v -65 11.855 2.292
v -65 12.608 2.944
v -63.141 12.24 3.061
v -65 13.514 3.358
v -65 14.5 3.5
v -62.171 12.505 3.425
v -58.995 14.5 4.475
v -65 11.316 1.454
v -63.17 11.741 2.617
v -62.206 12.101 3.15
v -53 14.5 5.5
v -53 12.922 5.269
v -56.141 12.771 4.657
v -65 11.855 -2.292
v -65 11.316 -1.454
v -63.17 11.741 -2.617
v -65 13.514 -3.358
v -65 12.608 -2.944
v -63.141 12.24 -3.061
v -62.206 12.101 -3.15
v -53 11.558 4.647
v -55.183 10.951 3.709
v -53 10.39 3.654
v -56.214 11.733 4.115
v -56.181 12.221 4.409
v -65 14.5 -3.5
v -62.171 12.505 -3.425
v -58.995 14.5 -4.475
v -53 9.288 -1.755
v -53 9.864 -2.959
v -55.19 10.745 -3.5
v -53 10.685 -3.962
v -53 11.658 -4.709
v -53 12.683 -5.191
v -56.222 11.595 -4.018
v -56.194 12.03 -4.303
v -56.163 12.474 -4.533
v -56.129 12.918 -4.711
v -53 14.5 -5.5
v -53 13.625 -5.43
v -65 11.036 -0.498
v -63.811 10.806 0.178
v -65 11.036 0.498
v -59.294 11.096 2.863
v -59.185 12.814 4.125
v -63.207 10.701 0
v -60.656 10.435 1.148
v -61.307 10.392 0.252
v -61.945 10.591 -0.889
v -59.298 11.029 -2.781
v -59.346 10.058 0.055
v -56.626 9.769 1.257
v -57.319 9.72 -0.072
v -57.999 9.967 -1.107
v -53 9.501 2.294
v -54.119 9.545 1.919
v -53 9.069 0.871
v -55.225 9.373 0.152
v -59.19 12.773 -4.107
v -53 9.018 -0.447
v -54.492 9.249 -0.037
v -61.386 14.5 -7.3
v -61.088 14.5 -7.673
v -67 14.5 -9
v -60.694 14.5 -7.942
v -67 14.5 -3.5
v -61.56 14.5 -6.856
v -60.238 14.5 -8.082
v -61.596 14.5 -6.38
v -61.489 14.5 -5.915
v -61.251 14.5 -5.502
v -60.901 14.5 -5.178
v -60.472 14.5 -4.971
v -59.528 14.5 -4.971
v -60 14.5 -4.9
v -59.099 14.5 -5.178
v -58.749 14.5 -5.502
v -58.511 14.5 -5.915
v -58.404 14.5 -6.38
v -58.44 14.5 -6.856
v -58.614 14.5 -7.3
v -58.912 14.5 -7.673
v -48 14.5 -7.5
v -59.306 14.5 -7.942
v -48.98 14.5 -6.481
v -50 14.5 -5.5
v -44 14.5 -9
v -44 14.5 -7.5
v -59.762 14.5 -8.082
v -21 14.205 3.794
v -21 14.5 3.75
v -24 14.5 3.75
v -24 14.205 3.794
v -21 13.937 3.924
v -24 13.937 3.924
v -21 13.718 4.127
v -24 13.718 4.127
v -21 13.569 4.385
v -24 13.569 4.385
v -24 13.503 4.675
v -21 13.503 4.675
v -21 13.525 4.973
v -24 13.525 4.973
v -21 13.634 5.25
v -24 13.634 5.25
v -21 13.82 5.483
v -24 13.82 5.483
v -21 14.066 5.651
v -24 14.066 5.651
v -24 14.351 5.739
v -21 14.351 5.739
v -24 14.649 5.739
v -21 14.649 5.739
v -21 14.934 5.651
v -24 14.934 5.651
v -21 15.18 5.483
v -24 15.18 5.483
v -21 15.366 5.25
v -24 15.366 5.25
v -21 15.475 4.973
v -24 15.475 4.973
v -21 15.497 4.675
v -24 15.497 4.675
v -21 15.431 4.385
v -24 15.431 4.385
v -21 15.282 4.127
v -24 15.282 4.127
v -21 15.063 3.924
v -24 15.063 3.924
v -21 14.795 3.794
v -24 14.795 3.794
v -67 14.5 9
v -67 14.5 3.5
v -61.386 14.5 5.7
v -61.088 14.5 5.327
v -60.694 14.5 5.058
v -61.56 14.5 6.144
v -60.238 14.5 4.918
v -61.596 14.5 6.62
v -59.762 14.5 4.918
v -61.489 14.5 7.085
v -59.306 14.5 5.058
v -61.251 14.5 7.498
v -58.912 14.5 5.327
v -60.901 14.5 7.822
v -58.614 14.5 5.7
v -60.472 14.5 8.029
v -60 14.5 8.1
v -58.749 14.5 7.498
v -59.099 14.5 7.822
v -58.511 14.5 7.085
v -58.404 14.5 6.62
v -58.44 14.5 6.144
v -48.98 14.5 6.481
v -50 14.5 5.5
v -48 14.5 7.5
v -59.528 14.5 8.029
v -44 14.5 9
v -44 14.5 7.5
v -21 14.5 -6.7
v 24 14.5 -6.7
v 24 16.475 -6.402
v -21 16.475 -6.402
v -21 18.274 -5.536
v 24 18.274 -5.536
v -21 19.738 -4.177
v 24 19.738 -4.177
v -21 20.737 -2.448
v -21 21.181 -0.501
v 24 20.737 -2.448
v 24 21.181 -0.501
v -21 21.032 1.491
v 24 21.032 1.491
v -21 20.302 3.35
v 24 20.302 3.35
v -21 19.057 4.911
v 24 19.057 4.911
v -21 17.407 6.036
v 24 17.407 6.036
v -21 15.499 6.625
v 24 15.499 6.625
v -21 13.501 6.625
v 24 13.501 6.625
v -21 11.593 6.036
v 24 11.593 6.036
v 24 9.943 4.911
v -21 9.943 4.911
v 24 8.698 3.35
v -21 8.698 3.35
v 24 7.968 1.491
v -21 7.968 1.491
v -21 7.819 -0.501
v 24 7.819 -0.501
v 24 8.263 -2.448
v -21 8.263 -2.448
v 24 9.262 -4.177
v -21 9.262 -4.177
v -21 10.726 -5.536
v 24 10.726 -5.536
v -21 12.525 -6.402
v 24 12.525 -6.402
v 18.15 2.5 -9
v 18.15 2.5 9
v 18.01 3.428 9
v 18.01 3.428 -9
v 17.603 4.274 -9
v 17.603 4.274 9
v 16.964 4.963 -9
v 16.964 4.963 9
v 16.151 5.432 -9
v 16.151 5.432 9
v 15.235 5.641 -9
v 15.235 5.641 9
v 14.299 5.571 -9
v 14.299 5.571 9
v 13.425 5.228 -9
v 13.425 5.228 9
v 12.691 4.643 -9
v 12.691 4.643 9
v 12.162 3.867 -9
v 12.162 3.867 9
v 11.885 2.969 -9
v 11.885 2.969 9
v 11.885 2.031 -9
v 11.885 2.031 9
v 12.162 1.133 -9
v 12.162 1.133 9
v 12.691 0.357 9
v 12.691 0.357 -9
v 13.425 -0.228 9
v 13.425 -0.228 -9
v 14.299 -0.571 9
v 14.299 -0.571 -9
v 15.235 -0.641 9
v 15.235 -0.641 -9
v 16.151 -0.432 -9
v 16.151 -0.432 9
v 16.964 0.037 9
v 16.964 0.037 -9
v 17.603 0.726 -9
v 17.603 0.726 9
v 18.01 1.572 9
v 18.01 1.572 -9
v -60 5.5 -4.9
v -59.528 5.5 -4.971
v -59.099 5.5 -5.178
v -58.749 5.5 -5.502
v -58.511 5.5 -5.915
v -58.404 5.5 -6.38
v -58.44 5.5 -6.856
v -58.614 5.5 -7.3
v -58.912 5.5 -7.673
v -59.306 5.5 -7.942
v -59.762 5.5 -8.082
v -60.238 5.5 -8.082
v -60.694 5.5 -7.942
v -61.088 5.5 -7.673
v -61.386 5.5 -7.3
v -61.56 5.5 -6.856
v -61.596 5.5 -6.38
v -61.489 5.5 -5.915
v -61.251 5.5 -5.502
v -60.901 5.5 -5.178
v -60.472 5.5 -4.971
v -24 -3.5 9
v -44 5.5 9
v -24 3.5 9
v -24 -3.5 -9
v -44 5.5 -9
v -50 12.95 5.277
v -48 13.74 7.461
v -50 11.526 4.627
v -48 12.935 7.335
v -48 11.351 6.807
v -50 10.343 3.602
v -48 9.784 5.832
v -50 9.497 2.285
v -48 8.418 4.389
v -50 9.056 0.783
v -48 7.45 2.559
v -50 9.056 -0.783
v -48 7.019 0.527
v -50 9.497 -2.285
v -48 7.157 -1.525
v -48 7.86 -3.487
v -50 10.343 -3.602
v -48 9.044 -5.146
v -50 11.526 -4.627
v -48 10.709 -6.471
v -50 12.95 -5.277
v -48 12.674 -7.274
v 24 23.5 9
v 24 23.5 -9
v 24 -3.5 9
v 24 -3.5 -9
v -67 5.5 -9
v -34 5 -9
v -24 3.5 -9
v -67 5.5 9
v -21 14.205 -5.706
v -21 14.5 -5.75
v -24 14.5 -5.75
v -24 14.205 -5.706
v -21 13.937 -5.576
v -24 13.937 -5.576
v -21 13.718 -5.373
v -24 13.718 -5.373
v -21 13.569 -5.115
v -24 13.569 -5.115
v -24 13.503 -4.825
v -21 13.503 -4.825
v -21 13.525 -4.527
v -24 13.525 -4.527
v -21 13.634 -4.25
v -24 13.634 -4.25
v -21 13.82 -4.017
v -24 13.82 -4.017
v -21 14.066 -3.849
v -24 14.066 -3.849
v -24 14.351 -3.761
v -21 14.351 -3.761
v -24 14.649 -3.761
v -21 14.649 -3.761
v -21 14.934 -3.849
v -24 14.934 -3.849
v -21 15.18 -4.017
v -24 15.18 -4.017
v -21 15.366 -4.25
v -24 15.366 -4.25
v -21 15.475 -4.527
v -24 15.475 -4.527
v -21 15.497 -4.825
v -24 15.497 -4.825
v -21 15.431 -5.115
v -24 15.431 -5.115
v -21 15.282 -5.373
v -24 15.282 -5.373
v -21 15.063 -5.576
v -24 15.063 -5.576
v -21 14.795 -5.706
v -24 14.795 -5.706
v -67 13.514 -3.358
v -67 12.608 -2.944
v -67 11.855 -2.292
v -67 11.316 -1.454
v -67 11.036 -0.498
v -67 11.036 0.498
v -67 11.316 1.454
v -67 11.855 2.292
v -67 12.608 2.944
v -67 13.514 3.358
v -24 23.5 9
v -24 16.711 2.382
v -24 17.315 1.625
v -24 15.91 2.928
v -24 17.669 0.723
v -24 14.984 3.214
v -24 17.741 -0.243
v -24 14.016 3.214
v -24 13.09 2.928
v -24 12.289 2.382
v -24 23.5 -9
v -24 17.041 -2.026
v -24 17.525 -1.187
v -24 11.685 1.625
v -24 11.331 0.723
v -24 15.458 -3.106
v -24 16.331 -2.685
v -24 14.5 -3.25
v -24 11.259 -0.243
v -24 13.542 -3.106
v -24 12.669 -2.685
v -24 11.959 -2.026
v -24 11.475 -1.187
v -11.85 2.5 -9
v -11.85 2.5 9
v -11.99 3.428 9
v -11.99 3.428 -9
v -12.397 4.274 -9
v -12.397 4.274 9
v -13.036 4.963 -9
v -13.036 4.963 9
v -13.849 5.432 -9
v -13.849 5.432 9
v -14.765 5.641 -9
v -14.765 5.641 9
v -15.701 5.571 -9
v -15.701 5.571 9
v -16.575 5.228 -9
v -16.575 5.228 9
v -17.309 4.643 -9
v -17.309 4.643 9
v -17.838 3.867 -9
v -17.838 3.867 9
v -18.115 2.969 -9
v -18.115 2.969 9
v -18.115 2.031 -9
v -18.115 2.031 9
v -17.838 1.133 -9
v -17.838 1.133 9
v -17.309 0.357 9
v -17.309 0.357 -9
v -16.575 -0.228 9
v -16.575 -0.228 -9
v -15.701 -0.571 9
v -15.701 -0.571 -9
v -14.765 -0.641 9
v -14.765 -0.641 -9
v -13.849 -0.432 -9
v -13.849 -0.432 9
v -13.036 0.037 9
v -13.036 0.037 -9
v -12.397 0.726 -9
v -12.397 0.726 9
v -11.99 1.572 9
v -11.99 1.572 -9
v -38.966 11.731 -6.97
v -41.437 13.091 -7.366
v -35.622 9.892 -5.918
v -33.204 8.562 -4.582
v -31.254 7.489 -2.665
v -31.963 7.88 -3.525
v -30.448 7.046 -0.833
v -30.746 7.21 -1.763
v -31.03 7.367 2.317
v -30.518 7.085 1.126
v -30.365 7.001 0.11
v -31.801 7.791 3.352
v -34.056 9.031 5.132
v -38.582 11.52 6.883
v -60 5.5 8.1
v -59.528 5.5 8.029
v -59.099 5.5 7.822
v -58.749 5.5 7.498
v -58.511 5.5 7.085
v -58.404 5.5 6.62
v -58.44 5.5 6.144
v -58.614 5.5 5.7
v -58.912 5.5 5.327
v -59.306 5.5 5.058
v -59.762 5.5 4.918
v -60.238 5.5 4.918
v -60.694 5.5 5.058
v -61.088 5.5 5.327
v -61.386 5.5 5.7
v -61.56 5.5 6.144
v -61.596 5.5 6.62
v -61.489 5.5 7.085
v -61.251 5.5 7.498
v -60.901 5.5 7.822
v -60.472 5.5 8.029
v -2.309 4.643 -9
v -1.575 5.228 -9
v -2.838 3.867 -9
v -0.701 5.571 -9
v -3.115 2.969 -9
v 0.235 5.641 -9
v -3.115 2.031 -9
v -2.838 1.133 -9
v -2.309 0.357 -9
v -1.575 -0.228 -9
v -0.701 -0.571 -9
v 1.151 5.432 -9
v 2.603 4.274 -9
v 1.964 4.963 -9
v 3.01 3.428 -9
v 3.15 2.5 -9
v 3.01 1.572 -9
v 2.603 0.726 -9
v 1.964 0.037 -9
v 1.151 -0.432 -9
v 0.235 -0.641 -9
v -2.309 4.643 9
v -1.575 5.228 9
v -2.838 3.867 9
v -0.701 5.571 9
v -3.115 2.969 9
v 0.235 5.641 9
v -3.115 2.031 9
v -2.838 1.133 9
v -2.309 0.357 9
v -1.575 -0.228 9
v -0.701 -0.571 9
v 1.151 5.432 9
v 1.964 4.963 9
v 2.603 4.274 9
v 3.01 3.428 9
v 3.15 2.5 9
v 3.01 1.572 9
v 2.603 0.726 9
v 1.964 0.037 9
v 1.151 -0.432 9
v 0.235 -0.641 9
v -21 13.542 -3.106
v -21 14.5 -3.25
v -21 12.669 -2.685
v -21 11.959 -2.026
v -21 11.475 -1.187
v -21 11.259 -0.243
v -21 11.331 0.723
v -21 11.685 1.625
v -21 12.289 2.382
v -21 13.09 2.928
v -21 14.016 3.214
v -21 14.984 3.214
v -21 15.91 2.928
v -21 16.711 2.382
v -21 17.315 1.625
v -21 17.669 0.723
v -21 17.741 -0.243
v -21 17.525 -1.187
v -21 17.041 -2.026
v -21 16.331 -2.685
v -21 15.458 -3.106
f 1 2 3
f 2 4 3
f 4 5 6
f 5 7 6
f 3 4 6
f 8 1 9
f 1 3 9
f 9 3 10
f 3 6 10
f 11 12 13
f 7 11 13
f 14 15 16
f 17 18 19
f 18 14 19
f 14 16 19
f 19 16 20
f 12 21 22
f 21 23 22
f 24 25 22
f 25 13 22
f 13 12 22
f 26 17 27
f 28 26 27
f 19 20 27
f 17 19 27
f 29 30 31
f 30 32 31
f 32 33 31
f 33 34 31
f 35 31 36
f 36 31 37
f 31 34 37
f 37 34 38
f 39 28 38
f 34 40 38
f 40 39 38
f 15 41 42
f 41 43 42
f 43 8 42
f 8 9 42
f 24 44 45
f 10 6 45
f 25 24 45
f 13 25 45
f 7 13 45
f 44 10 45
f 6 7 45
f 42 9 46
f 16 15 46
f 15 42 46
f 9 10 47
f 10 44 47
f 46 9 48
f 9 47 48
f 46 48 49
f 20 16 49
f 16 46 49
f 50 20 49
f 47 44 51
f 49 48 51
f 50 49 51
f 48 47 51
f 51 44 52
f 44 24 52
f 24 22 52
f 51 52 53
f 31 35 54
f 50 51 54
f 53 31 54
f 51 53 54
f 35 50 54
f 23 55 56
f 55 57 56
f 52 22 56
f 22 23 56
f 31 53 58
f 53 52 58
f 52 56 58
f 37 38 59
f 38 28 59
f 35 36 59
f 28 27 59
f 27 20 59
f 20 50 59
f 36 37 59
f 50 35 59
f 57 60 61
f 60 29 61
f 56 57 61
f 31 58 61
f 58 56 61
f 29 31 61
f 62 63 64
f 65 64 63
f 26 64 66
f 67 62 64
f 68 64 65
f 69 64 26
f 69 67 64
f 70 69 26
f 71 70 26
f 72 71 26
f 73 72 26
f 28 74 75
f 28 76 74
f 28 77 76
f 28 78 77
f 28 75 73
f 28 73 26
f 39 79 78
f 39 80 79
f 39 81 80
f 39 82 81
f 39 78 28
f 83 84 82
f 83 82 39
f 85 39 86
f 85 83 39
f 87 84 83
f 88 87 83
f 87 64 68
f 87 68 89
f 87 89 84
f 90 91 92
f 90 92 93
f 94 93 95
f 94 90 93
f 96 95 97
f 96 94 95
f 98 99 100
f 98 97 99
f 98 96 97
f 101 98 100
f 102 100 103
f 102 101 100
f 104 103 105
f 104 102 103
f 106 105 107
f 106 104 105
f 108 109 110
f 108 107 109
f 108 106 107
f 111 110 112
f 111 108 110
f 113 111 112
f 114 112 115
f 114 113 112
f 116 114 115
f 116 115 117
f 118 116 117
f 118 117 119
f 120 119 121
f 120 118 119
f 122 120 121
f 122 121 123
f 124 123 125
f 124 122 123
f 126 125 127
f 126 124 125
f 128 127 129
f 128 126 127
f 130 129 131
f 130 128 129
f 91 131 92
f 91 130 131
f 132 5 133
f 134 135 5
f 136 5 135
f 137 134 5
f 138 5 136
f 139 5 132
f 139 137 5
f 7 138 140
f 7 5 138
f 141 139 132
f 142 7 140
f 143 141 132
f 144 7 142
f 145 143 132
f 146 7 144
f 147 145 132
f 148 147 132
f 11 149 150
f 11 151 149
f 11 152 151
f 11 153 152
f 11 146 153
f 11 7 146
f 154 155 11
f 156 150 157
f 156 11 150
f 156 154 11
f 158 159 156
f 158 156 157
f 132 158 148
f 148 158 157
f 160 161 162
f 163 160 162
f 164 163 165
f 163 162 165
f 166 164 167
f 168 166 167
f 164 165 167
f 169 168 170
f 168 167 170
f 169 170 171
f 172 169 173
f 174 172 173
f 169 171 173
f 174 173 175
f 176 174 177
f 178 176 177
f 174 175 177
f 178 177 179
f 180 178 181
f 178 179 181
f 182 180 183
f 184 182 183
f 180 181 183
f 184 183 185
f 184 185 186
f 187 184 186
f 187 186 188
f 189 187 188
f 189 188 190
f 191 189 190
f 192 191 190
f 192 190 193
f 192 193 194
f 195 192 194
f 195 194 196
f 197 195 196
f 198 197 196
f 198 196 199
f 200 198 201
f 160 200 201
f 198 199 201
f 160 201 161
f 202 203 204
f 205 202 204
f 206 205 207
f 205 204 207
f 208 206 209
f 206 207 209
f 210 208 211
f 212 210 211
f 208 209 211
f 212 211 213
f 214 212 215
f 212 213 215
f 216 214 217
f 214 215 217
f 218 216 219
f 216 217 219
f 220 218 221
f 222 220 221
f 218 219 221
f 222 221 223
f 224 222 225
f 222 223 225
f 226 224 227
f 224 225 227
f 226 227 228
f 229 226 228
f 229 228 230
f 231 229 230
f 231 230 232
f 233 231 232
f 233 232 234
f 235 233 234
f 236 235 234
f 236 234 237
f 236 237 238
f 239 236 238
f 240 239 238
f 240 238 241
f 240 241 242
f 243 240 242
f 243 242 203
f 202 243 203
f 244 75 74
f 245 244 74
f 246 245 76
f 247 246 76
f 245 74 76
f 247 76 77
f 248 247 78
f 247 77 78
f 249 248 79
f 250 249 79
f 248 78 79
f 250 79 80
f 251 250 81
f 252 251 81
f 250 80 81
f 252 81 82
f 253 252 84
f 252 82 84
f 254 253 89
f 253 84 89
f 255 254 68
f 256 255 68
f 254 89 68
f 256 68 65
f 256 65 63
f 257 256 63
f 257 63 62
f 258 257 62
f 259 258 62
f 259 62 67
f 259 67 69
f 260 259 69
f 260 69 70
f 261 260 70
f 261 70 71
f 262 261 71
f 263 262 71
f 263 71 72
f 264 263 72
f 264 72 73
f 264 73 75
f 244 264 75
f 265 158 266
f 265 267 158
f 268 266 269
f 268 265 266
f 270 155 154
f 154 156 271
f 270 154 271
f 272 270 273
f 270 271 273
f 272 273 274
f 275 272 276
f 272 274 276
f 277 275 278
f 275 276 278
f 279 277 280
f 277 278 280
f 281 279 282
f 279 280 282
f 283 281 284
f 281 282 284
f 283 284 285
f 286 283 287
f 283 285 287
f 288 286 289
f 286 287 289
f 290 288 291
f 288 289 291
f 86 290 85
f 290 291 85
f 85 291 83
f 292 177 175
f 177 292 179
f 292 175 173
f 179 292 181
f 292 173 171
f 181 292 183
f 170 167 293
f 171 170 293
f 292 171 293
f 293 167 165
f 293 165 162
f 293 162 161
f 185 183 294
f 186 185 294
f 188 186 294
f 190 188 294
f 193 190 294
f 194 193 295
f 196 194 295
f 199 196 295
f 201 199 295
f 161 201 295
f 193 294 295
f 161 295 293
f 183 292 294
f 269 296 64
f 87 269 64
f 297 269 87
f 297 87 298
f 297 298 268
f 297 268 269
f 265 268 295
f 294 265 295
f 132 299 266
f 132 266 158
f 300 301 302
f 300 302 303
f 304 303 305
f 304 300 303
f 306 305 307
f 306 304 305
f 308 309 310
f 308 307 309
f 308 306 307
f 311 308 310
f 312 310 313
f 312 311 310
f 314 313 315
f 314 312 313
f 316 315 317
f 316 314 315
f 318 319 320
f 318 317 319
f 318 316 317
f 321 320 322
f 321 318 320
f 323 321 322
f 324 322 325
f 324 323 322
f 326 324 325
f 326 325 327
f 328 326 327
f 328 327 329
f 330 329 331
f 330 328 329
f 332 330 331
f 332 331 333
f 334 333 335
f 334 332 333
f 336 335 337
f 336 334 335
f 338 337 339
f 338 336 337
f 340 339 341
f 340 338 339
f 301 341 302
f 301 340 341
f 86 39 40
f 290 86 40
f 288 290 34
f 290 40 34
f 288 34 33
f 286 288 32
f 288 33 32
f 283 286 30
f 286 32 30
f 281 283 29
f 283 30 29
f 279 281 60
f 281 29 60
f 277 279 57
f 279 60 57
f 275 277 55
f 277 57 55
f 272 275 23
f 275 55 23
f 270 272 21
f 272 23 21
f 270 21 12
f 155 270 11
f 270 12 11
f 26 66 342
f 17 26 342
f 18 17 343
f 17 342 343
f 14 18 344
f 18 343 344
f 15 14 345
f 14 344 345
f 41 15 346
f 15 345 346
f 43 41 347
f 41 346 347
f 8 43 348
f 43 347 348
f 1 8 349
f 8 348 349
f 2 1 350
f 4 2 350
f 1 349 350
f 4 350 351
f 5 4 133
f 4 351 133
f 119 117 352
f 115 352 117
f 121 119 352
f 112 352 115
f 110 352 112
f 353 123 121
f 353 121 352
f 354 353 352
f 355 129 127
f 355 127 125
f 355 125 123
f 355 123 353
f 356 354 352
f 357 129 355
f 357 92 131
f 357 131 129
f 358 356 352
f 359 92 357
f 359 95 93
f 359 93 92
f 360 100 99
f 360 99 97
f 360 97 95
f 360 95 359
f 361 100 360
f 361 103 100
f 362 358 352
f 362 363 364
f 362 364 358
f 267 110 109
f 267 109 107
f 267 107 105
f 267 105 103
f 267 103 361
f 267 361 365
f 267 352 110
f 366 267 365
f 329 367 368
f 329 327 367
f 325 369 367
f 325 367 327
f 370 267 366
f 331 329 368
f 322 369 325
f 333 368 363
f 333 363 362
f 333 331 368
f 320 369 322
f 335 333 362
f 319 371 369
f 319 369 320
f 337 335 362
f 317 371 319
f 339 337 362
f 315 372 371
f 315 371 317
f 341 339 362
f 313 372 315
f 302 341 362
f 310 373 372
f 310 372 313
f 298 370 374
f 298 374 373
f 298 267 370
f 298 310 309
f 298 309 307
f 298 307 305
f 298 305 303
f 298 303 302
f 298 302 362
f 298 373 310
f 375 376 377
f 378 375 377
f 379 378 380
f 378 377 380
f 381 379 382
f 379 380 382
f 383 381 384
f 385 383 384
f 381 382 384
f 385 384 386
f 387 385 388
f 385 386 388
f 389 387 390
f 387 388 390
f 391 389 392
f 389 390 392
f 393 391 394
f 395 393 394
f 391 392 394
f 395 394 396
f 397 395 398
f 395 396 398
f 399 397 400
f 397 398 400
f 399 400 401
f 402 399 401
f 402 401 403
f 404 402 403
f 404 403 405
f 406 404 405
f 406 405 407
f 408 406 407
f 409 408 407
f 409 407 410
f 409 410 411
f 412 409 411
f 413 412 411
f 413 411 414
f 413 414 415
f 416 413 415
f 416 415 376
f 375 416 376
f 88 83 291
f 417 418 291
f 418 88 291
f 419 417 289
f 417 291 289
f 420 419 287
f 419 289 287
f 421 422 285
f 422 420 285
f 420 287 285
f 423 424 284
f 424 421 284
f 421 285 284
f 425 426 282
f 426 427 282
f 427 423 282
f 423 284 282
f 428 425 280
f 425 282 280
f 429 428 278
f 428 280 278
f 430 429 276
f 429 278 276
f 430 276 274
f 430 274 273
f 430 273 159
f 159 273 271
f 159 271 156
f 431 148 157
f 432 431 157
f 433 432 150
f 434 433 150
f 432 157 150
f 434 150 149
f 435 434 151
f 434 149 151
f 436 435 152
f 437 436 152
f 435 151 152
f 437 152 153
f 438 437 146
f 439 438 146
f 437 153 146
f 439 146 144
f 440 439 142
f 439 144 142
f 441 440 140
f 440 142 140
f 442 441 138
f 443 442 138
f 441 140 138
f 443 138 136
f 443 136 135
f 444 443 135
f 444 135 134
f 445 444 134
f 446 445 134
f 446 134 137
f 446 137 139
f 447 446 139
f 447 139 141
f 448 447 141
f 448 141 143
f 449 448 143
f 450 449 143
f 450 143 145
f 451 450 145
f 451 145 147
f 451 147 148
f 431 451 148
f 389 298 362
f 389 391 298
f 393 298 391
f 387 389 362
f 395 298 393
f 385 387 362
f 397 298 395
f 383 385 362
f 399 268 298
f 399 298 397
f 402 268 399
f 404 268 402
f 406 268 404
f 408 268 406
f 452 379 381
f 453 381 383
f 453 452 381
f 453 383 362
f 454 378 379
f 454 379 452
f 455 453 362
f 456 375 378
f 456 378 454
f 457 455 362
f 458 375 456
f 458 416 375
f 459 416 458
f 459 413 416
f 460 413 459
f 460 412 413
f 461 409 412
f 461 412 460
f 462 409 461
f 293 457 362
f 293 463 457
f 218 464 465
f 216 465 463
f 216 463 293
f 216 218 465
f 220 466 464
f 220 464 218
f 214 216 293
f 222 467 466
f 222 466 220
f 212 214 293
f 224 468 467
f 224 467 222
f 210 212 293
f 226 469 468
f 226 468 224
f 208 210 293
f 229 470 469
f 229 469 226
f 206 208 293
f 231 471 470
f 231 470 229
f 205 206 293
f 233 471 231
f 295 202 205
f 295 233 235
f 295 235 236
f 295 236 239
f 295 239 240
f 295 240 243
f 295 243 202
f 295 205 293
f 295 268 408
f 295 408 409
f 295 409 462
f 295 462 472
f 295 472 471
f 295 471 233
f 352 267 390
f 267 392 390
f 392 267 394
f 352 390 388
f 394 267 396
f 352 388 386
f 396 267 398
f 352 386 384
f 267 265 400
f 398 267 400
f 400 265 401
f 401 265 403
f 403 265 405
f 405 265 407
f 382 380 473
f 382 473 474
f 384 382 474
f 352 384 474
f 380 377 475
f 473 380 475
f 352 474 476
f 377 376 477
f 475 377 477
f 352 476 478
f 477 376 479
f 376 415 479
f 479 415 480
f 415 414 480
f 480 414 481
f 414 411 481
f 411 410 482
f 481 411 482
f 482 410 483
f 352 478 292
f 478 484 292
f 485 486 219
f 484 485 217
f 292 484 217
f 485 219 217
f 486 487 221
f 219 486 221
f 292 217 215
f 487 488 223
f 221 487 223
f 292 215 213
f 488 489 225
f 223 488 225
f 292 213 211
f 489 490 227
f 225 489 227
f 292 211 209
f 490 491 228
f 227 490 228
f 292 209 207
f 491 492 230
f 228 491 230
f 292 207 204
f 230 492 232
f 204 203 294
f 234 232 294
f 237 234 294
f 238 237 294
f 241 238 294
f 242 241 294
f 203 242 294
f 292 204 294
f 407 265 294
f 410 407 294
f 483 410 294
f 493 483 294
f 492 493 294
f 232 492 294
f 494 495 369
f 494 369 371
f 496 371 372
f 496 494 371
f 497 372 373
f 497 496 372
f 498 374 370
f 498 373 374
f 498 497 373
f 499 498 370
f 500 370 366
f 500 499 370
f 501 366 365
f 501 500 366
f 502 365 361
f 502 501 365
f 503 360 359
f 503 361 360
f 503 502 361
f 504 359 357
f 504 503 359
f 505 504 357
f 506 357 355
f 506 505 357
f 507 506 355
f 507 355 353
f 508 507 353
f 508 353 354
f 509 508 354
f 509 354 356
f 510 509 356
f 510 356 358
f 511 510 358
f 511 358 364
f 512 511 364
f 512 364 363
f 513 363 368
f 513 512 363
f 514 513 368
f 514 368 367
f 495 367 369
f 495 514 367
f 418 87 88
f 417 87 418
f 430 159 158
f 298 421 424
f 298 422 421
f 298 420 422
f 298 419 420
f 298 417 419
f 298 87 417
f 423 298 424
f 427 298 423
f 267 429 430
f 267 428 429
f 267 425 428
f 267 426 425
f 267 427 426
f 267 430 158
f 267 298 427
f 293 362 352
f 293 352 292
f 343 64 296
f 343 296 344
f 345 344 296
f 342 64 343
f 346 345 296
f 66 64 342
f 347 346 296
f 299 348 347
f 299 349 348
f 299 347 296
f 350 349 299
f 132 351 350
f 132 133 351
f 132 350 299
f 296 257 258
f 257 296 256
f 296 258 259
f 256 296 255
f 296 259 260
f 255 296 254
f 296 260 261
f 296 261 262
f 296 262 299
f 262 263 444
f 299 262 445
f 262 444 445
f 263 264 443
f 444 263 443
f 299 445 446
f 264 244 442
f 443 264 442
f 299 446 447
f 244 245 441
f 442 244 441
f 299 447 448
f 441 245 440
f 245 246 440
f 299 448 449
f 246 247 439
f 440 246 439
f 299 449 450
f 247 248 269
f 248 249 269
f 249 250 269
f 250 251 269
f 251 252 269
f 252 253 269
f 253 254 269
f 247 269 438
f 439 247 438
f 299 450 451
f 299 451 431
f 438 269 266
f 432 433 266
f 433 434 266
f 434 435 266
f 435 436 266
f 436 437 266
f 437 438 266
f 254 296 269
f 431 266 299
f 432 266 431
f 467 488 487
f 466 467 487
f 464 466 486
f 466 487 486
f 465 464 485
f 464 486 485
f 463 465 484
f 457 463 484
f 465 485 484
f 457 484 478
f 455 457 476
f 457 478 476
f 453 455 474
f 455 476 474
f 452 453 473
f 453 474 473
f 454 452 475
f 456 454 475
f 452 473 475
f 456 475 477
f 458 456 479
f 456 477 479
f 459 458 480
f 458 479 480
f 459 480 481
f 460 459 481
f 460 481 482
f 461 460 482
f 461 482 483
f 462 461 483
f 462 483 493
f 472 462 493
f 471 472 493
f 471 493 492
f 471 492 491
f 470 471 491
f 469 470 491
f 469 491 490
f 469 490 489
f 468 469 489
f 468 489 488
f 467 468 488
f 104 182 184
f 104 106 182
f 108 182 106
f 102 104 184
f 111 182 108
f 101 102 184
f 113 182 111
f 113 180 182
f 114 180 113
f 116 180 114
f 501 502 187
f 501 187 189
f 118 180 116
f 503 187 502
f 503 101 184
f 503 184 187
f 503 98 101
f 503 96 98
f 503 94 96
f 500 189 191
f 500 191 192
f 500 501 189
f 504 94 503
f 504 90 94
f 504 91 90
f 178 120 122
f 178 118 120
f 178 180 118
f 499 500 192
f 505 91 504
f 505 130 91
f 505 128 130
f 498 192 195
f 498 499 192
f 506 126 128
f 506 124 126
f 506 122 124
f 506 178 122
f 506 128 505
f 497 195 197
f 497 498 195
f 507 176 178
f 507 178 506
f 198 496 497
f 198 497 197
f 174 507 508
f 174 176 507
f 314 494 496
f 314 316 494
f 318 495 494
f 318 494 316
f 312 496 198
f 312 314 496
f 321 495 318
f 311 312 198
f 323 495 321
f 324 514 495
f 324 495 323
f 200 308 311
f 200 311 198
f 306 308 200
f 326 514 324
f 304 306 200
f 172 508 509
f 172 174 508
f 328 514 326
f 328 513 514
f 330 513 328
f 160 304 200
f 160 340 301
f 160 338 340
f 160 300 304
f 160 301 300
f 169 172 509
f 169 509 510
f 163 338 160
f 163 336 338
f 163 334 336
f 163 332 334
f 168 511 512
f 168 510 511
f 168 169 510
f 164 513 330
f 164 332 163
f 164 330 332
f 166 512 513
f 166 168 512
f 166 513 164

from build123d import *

# Parameters (mm, degrees)
SKETCH_1_W          = 48
SKETCH_1_H          = 18
EXTRUDE_1_DEPTH     = 3.5
SKETCH_6_W          = 18
SKETCH_6_H          = 9
EXTRUDE_4_DEPTH     = 23
SKETCH_7_R          = 3.5
CUT_EXTRUDE_1_DEPTH = 2
SKETCH_9_R          = 5.5
CUT_EXTRUDE_4_DEPTH = 3
CUT_EXTRUDE_5_REACH = 75.995
SKETCH_10_R         = 7.5
CUT_EXTRUDE_6_REACH = 71.957
SKETCH_11_R         = 1.6
EXTRUDE_5_OUTLINE_W = 48
EXTRUDE_5_OUTLINE_H = 18
EXTRUDE_5_DEPTH     = 20
CUT_EXTRUDE_7_REACH = 96.415
SKETCH_13_R         = 3.25
SKETCH_13_R_2       = 1
SKETCH_15_R         = 6.7
CUT_EXTRUDE_8_DEPTH = 45
SKETCH_16_R         = 3.15
CUT_EXTRUDE_9_DEPTH = 74.247867011


with BuildPart() as part:
    # 草圖1 → 填料-伸長1 (new, symmetric)
    with BuildSketch(Plane(origin=(0, 0, 0), x_dir=(1, 0, 0), z_dir=(0, 1, 0))):
        Rectangle(SKETCH_1_W, SKETCH_1_H)
    extrude(amount=EXTRUDE_1_DEPTH, both=True)

    # Sketch 3D_3 → Loft 1 section 0
    with BuildSketch(Plane(origin=(-44, 14.5, -9), x_dir=(0, -0.447213595499958, 0.894427190999916), z_dir=(-1, 0, 0))):
        with BuildLine():
            Line((0, 0), (16.099689438, 8.049844719))
            Line((16.099689438, 8.049844719), (20.124611797, 0))
            Line((20.124611797, 0), (4.024922359, -8.049844719))
            Line((4.024922359, -8.049844719), (0, 0))
        make_face()
    # 草圖5 → Loft 1 section 1
    with BuildSketch(Plane.ZY.offset(24)):
        with BuildLine():
            Line((-9, 3.5), (9, 3.5))
            Line((9, 3.5), (9, -3.5))
            Line((9, -3.5), (-9, -3.5))
            Line((-9, -3.5), (-9, 3.5))
        make_face()
    loft()

    # 草圖6 → 填料-伸長4 (add)
    with BuildSketch(Plane.ZY.offset(44)):
        with Locations((0, 10)):
            Rectangle(SKETCH_6_W, SKETCH_6_H)
    extrude(amount=EXTRUDE_4_DEPTH)

    # 草圖7 → 除料-伸長1 (cut)
    with BuildSketch(Plane.ZY.offset(67)):
        with Locations((0, 14.5)):
            Circle(SKETCH_7_R)
    extrude(amount=-CUT_EXTRUDE_1_DEPTH, mode=Mode.SUBTRACT)

    # Loft 1 2: read off the stored shape, not the designer's step
    # Loft 1 2: loft between two sections, ruled curve by curve
    loft_1_2_from = [
        Edge.make_bspline([(-65, 14.5, 3.5), (-65, 12.75, 3.5), (-65, 11, 2.333333333), (-65, 11, -2.333333333), (-65, 12.75, -3.5), (-65, 14.5, -3.5)], [0, 0, 0, 0, 0.5, 0.5, 1, 1, 1, 1], 3, [1, 0.666666667, 0.5, 0.5, 0.666666667, 1]),
        Edge.make_line((-65, 14.5, -3.5), (-65, 14.5, 3.5)),
    ]
    loft_1_2_to = [
        Edge.make_bspline([(-53, 15.833945938, 5.335783751), (-53, 12.063417219, 6.27841593), (-53, 9, 3.886572043), (-53, 9, -3.886572043), (-53, 12.063417219, -6.27841593), (-53, 15.833945938, -5.335783751)], [0, 0, 0, 0, 0.5, 0.5, 1, 1, 1, 1], 3, [1, 0.552953065, 0.4111804, 0.4111804, 0.552953065, 1]),
        Edge.make_line((-53, 15.833945938, -5.335783751), (-53, 15.833945938, 5.335783751)),
    ]
    loft_1_2 = Solid(Shell([*[Face.make_surface_from_curves(loft_1_2_from[k], loft_1_2_to[k]) for k in range(2)], Face(Wire(loft_1_2_from)), Face(Wire(loft_1_2_to))]))
    add(loft_1_2, mode=Mode.SUBTRACT)

    # 草圖9 → 除料-伸長4 (cut)
    with BuildSketch(Plane.ZY.offset(53)):
        with Locations((3.554e-06, 14.500000002)):
            Circle(SKETCH_9_R)
    extrude(amount=-CUT_EXTRUDE_4_DEPTH, mode=Mode.SUBTRACT)

    # 除料-疊層拉伸4: read off the stored shape, not the designer's step
    # 除料-疊層拉伸4: loft between two sections, ruled curve by curve
    loft_4_from = [
        Edge.make_bspline([(-50, 14.5, 5.500003554), (-50, 11.750000001, 5.500003553), (-50, 9.000000002, 3.66667022), (-50, 9.000000002, -3.666663111), (-50, 11.750000001, -5.499996445), (-50, 14.5, -5.499996446)], [0, 0, 0, 0, 0.5, 0.5, 1, 1, 1, 1], 3, [1, 0.666666667, 0.5, 0.5, 0.666666667, 1]),
        Edge.make_line((-50, 14.5, -5.499996446), (-50, 14.5, 5.500003554)),
    ]
    loft_4_to = [
        Edge.make_bspline([(-48, 16.319017189, 7.276072306), (-48, 11.177387119, 8.561479823), (-48, 7.000000002, 5.299874521), (-48, 7.000000002, -5.299867413), (-48, 11.177387119, -8.561472714), (-48, 16.319017189, -7.276065197)], [0, 0, 0, 0, 0.5, 0.5, 1, 1, 1, 1], 3, [1, 0.552953065, 0.4111804, 0.4111804, 0.552953065, 1]),
        Edge.make_line((-48, 16.319017189, -7.276065197), (-48, 16.319017189, 7.276072306)),
    ]
    loft_4 = Solid(Shell([*[Face.make_surface_from_curves(loft_4_from[k], loft_4_to[k]) for k in range(2)], Face(Wire(loft_4_from)), Face(Wire(loft_4_to))]))
    add(loft_4, mode=Mode.SUBTRACT)

    # 草圖10 → 除料-伸長5 (cut, up to next)
    with BuildSketch(Plane.ZY.offset(48), mode=Mode.PRIVATE) as cut_extrude_5_sk1:
        with Locations((4.786e-06, 14.500000002)):
            Circle(SKETCH_10_R)
    cut_extrude_5_tool1 = extrude(cut_extrude_5_sk1.sketch, amount=-CUT_EXTRUDE_5_REACH, mode=Mode.PRIVATE) & part.part
    add(cut_extrude_5_tool1.solids().sort_by_distance((-48, 14.5, 5e-06))[0], mode=Mode.SUBTRACT)

    # 草圖11 → 除料-伸長6 (cut, up to next)
    with BuildSketch(Plane(origin=(0, 14.5, 0), x_dir=(1, 0, 0), z_dir=(0, 1, 0)), mode=Mode.PRIVATE) as cut_extrude_6_sk1:
        with Locations(Location((-60, -6.5, 0), (0, 0, 270))):
            Circle(SKETCH_11_R)
    cut_extrude_6_tool1 = extrude(cut_extrude_6_sk1.sketch, amount=-CUT_EXTRUDE_6_REACH, mode=Mode.PRIVATE) & part.part
    # 草圖11 → 除料-伸長6 (cut, up to next)
    with BuildSketch(Plane(origin=(0, 14.5, 0), x_dir=(1, 0, 0), z_dir=(0, 1, 0)), mode=Mode.PRIVATE) as cut_extrude_6_sk2:
        with Locations(Location((-60, 6.5, 0), (0, 0, 270))):
            Circle(SKETCH_11_R)
    cut_extrude_6_tool2 = extrude(cut_extrude_6_sk2.sketch, amount=-CUT_EXTRUDE_6_REACH, mode=Mode.PRIVATE) & part.part
    add(cut_extrude_6_tool1.solids().sort_by_distance((-60, 14.5, 6.5))[0], mode=Mode.SUBTRACT)
    add(cut_extrude_6_tool2.solids().sort_by_distance((-60, 14.5, -6.5))[0], mode=Mode.SUBTRACT)

    # 填料-伸長5: read off the stored shape, not the designer's step
    # 填料-伸長5 outline → 填料-伸長5 (add)
    with BuildSketch(Plane(origin=(0, 3.5, 0), x_dir=(1, 0, 0), z_dir=(0, 1, 0))):
        Rectangle(EXTRUDE_5_OUTLINE_W, EXTRUDE_5_OUTLINE_H)
    extrude(amount=EXTRUDE_5_DEPTH)

    # 草圖13 → 除料-伸長7 (cut, up to next)
    with BuildSketch(Plane.ZY.offset(-24), mode=Mode.PRIVATE) as cut_extrude_7_sk1:
        with Locations(Location((0, 14.5, 0), (0, 0, 180))):
            Circle(SKETCH_13_R)
    cut_extrude_7_tool1 = extrude(cut_extrude_7_sk1.sketch, amount=CUT_EXTRUDE_7_REACH, mode=Mode.PRIVATE) & part.part
    # 草圖13 → 除料-伸長7 (cut, up to next)
    with BuildSketch(Plane.ZY.offset(-24), mode=Mode.PRIVATE) as cut_extrude_7_sk2:
        with Locations(Location((-4.75, 14.5, 0), (0, 0, 180))):
            Circle(SKETCH_13_R_2)
    cut_extrude_7_tool2 = extrude(cut_extrude_7_sk2.sketch, amount=CUT_EXTRUDE_7_REACH, mode=Mode.PRIVATE) & part.part
    # 草圖13 → 除料-伸長7 (cut, up to next)
    with BuildSketch(Plane.ZY.offset(-24), mode=Mode.PRIVATE) as cut_extrude_7_sk3:
        with Locations(Location((4.75, 14.5, 0), (0, 0, 180))):
            Circle(SKETCH_13_R_2)
    cut_extrude_7_tool3 = extrude(cut_extrude_7_sk3.sketch, amount=CUT_EXTRUDE_7_REACH, mode=Mode.PRIVATE) & part.part
    add(cut_extrude_7_tool1.solids().sort_by_distance((24, 14.5, 0))[0], mode=Mode.SUBTRACT)
    add(cut_extrude_7_tool2.solids().sort_by_distance((24, 14.5, -4.75))[0], mode=Mode.SUBTRACT)
    add(cut_extrude_7_tool3.solids().sort_by_distance((24, 14.5, 4.75))[0], mode=Mode.SUBTRACT)

    # 草圖15 → 除料-伸長8 (cut)
    with BuildSketch(Plane(origin=(24, 0, 0), x_dir=(0, 0, -1), z_dir=(1, 0, 0))):
        with Locations((0, 14.5)):
            Circle(SKETCH_15_R)
    extrude(amount=-CUT_EXTRUDE_8_DEPTH, mode=Mode.SUBTRACT)

    # 草圖16 → 除料-伸長9 (cut, through all)
    with BuildSketch(Plane.XY.offset(9)):
        with Locations((15, 2.5)):
            Circle(SKETCH_16_R)
        with Locations((0, 2.5)):
            Circle(SKETCH_16_R)
        with Locations((-15, 2.5)):
            Circle(SKETCH_16_R)
    extrude(amount=-CUT_EXTRUDE_9_DEPTH, mode=Mode.SUBTRACT)


solid = part.part
